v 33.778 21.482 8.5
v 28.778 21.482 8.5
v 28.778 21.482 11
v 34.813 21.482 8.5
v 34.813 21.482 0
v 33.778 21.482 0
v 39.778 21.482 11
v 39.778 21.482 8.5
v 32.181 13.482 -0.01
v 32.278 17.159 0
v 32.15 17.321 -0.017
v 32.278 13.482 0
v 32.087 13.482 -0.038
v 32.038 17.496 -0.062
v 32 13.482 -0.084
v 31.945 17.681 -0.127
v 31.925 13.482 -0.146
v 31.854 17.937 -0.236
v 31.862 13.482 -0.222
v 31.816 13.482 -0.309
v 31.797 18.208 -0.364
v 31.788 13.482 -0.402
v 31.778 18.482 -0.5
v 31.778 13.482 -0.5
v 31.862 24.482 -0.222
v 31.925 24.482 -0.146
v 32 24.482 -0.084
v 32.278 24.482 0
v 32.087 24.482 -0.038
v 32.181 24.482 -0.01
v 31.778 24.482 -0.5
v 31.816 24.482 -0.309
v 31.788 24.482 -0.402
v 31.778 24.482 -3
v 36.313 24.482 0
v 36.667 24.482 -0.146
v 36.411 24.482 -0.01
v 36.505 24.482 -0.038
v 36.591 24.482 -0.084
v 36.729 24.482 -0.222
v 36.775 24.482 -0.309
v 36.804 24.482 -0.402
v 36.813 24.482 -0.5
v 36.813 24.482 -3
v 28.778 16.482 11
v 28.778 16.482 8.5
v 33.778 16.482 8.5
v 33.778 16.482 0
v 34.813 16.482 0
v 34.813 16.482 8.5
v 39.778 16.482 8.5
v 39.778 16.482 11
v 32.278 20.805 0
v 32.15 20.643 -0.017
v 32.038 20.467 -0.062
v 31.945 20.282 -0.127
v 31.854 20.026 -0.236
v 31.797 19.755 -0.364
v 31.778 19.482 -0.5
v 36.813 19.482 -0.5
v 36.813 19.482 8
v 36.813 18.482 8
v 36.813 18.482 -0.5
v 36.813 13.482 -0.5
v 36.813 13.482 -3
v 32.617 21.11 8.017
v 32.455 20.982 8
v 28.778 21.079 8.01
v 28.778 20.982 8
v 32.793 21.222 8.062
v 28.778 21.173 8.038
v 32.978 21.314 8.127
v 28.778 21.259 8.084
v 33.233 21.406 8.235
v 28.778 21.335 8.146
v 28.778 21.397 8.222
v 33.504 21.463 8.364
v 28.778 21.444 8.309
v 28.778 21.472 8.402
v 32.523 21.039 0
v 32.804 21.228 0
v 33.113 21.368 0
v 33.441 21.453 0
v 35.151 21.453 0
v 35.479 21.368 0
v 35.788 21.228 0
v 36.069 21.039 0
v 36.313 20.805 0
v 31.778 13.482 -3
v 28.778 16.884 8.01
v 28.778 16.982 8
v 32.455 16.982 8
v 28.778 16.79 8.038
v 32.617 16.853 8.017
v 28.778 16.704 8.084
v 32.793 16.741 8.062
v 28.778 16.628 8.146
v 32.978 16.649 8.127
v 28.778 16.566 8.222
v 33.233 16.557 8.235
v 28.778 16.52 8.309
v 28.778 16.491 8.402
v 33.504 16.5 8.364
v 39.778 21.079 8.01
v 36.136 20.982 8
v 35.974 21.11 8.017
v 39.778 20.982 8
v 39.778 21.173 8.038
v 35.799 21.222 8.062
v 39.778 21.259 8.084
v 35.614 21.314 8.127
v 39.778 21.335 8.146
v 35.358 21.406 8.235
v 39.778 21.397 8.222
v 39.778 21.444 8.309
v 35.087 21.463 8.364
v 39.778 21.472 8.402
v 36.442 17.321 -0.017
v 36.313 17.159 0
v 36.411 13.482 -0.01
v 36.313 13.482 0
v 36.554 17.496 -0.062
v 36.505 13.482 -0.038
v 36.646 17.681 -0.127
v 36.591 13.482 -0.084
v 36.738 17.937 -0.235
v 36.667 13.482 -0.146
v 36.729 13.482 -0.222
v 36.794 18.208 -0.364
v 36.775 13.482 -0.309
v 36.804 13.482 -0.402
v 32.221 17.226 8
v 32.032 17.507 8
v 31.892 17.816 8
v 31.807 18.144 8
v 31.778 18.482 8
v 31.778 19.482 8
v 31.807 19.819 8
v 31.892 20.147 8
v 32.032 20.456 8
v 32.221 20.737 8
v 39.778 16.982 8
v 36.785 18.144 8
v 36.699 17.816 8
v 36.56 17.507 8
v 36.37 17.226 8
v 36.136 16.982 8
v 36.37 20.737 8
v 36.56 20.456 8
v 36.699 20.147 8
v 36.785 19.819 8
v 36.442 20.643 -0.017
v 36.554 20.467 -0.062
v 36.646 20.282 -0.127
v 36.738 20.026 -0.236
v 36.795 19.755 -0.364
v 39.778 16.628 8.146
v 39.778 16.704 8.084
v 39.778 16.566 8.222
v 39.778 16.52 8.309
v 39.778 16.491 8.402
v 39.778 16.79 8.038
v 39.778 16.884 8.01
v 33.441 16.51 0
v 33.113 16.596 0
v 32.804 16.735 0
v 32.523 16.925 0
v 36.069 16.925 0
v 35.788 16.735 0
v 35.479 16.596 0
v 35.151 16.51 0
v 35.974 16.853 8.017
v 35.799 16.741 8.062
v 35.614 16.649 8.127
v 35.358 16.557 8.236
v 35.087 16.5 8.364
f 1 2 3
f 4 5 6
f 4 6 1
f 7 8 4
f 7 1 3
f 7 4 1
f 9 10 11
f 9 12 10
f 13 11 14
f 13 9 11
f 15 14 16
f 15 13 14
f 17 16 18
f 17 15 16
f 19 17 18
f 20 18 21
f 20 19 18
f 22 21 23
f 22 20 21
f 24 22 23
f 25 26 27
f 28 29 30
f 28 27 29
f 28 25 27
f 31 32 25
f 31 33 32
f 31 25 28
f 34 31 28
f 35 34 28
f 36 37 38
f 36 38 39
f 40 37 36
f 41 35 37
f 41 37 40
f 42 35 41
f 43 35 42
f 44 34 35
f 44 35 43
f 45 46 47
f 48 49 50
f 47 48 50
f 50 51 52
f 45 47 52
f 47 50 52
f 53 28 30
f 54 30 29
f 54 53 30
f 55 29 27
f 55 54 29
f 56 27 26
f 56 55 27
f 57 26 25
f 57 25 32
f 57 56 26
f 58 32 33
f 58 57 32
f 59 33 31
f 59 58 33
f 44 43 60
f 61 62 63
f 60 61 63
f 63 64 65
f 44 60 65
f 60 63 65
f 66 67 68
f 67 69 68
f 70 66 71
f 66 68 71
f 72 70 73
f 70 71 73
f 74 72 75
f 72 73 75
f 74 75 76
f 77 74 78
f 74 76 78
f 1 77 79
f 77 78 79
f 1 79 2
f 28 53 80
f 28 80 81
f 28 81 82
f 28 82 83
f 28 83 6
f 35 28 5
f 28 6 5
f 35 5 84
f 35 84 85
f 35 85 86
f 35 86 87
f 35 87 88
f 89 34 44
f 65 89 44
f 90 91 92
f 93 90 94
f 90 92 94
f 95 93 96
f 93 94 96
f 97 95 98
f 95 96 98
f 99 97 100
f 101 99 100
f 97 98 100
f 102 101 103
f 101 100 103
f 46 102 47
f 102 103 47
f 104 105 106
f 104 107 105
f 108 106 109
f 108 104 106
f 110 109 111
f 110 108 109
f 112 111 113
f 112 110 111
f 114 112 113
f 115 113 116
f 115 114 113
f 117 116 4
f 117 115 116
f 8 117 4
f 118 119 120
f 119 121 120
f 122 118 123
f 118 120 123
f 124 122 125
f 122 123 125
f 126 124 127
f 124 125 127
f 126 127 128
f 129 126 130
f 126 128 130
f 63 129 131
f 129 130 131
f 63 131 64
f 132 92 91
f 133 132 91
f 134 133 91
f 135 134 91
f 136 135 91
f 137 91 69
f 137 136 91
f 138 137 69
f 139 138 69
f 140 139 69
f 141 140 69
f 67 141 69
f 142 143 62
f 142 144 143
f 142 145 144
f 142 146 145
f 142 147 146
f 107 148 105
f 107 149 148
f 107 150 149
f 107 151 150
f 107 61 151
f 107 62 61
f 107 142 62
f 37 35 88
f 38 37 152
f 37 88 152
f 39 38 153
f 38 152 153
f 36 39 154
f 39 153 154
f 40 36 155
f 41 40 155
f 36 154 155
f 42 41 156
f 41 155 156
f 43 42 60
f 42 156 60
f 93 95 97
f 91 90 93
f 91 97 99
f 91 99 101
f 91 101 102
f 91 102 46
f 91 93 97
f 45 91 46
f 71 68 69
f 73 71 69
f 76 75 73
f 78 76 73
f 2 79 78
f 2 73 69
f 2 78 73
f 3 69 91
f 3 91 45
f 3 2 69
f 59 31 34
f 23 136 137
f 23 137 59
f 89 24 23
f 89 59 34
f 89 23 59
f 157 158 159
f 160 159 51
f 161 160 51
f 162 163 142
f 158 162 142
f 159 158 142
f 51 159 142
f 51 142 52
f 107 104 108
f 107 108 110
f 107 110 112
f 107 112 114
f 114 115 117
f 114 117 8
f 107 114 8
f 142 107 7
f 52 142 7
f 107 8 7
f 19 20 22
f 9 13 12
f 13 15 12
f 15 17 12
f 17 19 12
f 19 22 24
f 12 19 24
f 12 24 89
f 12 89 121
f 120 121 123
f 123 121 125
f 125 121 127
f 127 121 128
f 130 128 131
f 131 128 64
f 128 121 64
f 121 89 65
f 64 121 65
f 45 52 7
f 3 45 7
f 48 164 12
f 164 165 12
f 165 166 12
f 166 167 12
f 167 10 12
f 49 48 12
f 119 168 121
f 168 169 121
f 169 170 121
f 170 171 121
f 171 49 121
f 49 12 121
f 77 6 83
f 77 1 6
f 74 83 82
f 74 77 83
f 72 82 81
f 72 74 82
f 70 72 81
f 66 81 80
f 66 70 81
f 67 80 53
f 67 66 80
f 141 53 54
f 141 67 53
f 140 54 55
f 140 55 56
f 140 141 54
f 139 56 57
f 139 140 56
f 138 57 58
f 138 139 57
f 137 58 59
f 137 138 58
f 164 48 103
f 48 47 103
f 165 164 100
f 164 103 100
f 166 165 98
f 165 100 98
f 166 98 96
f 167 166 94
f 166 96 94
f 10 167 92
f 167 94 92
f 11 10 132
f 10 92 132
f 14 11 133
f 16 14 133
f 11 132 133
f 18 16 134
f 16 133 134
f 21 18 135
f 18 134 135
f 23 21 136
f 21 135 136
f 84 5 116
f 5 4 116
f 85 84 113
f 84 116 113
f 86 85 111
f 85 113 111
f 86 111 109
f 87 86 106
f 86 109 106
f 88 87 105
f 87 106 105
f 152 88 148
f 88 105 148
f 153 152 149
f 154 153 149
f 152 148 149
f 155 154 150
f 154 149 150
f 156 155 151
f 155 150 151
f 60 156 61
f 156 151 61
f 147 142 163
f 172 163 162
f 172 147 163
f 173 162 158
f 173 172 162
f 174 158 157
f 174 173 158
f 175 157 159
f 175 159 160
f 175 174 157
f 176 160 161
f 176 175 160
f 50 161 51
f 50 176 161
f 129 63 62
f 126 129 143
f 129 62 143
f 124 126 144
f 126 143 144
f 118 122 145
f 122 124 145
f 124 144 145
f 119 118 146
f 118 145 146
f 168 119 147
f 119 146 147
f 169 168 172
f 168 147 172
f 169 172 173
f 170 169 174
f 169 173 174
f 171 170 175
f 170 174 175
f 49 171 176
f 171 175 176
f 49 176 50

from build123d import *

# Parameters (mm, degrees)
ESQUISSE1_W         = 5.035107038
ESQUISSE1_H         = 5
BASE_DEPTH          = 8
BOSS_1_DEPTH        = 3
BOSS_1_DEPTH_BACK   = 8
ESQUISSE4_W         = 5.035107038
ESQUISSE4_H         = 3
BOSS_2_DEPTH        = 3
BOSS_2_DEPTH_BACK   = 8
ESQUISSE5_W         = 3
ESQUISSE5_H         = 5
CONGE_MILIEU_R      = 2
CONGE_HAUT_ET_BAS_R = 0.5


with BuildPart() as part:
    # Esquisse1 → BASE (new body)
    with BuildSketch(Plane.XY):
        with Locations((34.295782161, 18.98164147)):
            Rectangle(ESQUISSE1_W, ESQUISSE1_H)
    extrude(amount=BASE_DEPTH)

    # Esquisse4 → BOSS 1 (add, two sides: drawn at the far end of the back side and taken through both)
    with BuildSketch(Plane(origin=(0, 21.48164147, 0), x_dir=(1, 0, 0), z_dir=(0, 1, 0)).offset(-BOSS_1_DEPTH_BACK)):
        with Locations((34.295782161, 1.5)):
            Rectangle(ESQUISSE4_W, ESQUISSE4_H)
    extrude(amount=BOSS_1_DEPTH + BOSS_1_DEPTH_BACK)

    # Esquisse5 → BOSS 2 (add, two sides: drawn at the far end of the back side and taken through both)
    with BuildSketch(Plane.ZY.offset(-31.778228642).offset(-BOSS_2_DEPTH_BACK)):
        with Locations((9.5, 18.98164147)):
            Rectangle(ESQUISSE5_W, ESQUISSE5_H)
    extrude(amount=BOSS_2_DEPTH + BOSS_2_DEPTH_BACK)

    # CONGE MILIEU
    conge_milieu_edges = [part.edges().sort_by_distance(p)[0] for p in [
        (36.81333568, 21.48164147, 4),
        (31.778228642, 21.48164147, 4),
        (31.778228642, 16.48164147, 4),
        (36.81333568, 16.48164147, 4),
    ]]
    fillet(conge_milieu_edges, radius=CONGE_MILIEU_R)

    # CONGE HAUT ET BAS
    conge_haut_et_bas_edges = [part.edges().sort_by_distance(p)[0] for p in [
        (36.81333568, 15.98164147, 0),
        (36.81333568, 21.98164147, 0),
        (31.778228642, 15.98164147, 0),
        (31.778228642, 21.98164147, 0),
        (37.295782161, 16.48164147, 8),
        (31.278228642, 16.48164147, 8),
        (37.295782161, 21.48164147, 8),
        (31.278228642, 21.48164147, 8),
    ]]
    fillet(conge_haut_et_bas_edges, radius=CONGE_HAUT_ET_BAS_R)


solid = part.part
